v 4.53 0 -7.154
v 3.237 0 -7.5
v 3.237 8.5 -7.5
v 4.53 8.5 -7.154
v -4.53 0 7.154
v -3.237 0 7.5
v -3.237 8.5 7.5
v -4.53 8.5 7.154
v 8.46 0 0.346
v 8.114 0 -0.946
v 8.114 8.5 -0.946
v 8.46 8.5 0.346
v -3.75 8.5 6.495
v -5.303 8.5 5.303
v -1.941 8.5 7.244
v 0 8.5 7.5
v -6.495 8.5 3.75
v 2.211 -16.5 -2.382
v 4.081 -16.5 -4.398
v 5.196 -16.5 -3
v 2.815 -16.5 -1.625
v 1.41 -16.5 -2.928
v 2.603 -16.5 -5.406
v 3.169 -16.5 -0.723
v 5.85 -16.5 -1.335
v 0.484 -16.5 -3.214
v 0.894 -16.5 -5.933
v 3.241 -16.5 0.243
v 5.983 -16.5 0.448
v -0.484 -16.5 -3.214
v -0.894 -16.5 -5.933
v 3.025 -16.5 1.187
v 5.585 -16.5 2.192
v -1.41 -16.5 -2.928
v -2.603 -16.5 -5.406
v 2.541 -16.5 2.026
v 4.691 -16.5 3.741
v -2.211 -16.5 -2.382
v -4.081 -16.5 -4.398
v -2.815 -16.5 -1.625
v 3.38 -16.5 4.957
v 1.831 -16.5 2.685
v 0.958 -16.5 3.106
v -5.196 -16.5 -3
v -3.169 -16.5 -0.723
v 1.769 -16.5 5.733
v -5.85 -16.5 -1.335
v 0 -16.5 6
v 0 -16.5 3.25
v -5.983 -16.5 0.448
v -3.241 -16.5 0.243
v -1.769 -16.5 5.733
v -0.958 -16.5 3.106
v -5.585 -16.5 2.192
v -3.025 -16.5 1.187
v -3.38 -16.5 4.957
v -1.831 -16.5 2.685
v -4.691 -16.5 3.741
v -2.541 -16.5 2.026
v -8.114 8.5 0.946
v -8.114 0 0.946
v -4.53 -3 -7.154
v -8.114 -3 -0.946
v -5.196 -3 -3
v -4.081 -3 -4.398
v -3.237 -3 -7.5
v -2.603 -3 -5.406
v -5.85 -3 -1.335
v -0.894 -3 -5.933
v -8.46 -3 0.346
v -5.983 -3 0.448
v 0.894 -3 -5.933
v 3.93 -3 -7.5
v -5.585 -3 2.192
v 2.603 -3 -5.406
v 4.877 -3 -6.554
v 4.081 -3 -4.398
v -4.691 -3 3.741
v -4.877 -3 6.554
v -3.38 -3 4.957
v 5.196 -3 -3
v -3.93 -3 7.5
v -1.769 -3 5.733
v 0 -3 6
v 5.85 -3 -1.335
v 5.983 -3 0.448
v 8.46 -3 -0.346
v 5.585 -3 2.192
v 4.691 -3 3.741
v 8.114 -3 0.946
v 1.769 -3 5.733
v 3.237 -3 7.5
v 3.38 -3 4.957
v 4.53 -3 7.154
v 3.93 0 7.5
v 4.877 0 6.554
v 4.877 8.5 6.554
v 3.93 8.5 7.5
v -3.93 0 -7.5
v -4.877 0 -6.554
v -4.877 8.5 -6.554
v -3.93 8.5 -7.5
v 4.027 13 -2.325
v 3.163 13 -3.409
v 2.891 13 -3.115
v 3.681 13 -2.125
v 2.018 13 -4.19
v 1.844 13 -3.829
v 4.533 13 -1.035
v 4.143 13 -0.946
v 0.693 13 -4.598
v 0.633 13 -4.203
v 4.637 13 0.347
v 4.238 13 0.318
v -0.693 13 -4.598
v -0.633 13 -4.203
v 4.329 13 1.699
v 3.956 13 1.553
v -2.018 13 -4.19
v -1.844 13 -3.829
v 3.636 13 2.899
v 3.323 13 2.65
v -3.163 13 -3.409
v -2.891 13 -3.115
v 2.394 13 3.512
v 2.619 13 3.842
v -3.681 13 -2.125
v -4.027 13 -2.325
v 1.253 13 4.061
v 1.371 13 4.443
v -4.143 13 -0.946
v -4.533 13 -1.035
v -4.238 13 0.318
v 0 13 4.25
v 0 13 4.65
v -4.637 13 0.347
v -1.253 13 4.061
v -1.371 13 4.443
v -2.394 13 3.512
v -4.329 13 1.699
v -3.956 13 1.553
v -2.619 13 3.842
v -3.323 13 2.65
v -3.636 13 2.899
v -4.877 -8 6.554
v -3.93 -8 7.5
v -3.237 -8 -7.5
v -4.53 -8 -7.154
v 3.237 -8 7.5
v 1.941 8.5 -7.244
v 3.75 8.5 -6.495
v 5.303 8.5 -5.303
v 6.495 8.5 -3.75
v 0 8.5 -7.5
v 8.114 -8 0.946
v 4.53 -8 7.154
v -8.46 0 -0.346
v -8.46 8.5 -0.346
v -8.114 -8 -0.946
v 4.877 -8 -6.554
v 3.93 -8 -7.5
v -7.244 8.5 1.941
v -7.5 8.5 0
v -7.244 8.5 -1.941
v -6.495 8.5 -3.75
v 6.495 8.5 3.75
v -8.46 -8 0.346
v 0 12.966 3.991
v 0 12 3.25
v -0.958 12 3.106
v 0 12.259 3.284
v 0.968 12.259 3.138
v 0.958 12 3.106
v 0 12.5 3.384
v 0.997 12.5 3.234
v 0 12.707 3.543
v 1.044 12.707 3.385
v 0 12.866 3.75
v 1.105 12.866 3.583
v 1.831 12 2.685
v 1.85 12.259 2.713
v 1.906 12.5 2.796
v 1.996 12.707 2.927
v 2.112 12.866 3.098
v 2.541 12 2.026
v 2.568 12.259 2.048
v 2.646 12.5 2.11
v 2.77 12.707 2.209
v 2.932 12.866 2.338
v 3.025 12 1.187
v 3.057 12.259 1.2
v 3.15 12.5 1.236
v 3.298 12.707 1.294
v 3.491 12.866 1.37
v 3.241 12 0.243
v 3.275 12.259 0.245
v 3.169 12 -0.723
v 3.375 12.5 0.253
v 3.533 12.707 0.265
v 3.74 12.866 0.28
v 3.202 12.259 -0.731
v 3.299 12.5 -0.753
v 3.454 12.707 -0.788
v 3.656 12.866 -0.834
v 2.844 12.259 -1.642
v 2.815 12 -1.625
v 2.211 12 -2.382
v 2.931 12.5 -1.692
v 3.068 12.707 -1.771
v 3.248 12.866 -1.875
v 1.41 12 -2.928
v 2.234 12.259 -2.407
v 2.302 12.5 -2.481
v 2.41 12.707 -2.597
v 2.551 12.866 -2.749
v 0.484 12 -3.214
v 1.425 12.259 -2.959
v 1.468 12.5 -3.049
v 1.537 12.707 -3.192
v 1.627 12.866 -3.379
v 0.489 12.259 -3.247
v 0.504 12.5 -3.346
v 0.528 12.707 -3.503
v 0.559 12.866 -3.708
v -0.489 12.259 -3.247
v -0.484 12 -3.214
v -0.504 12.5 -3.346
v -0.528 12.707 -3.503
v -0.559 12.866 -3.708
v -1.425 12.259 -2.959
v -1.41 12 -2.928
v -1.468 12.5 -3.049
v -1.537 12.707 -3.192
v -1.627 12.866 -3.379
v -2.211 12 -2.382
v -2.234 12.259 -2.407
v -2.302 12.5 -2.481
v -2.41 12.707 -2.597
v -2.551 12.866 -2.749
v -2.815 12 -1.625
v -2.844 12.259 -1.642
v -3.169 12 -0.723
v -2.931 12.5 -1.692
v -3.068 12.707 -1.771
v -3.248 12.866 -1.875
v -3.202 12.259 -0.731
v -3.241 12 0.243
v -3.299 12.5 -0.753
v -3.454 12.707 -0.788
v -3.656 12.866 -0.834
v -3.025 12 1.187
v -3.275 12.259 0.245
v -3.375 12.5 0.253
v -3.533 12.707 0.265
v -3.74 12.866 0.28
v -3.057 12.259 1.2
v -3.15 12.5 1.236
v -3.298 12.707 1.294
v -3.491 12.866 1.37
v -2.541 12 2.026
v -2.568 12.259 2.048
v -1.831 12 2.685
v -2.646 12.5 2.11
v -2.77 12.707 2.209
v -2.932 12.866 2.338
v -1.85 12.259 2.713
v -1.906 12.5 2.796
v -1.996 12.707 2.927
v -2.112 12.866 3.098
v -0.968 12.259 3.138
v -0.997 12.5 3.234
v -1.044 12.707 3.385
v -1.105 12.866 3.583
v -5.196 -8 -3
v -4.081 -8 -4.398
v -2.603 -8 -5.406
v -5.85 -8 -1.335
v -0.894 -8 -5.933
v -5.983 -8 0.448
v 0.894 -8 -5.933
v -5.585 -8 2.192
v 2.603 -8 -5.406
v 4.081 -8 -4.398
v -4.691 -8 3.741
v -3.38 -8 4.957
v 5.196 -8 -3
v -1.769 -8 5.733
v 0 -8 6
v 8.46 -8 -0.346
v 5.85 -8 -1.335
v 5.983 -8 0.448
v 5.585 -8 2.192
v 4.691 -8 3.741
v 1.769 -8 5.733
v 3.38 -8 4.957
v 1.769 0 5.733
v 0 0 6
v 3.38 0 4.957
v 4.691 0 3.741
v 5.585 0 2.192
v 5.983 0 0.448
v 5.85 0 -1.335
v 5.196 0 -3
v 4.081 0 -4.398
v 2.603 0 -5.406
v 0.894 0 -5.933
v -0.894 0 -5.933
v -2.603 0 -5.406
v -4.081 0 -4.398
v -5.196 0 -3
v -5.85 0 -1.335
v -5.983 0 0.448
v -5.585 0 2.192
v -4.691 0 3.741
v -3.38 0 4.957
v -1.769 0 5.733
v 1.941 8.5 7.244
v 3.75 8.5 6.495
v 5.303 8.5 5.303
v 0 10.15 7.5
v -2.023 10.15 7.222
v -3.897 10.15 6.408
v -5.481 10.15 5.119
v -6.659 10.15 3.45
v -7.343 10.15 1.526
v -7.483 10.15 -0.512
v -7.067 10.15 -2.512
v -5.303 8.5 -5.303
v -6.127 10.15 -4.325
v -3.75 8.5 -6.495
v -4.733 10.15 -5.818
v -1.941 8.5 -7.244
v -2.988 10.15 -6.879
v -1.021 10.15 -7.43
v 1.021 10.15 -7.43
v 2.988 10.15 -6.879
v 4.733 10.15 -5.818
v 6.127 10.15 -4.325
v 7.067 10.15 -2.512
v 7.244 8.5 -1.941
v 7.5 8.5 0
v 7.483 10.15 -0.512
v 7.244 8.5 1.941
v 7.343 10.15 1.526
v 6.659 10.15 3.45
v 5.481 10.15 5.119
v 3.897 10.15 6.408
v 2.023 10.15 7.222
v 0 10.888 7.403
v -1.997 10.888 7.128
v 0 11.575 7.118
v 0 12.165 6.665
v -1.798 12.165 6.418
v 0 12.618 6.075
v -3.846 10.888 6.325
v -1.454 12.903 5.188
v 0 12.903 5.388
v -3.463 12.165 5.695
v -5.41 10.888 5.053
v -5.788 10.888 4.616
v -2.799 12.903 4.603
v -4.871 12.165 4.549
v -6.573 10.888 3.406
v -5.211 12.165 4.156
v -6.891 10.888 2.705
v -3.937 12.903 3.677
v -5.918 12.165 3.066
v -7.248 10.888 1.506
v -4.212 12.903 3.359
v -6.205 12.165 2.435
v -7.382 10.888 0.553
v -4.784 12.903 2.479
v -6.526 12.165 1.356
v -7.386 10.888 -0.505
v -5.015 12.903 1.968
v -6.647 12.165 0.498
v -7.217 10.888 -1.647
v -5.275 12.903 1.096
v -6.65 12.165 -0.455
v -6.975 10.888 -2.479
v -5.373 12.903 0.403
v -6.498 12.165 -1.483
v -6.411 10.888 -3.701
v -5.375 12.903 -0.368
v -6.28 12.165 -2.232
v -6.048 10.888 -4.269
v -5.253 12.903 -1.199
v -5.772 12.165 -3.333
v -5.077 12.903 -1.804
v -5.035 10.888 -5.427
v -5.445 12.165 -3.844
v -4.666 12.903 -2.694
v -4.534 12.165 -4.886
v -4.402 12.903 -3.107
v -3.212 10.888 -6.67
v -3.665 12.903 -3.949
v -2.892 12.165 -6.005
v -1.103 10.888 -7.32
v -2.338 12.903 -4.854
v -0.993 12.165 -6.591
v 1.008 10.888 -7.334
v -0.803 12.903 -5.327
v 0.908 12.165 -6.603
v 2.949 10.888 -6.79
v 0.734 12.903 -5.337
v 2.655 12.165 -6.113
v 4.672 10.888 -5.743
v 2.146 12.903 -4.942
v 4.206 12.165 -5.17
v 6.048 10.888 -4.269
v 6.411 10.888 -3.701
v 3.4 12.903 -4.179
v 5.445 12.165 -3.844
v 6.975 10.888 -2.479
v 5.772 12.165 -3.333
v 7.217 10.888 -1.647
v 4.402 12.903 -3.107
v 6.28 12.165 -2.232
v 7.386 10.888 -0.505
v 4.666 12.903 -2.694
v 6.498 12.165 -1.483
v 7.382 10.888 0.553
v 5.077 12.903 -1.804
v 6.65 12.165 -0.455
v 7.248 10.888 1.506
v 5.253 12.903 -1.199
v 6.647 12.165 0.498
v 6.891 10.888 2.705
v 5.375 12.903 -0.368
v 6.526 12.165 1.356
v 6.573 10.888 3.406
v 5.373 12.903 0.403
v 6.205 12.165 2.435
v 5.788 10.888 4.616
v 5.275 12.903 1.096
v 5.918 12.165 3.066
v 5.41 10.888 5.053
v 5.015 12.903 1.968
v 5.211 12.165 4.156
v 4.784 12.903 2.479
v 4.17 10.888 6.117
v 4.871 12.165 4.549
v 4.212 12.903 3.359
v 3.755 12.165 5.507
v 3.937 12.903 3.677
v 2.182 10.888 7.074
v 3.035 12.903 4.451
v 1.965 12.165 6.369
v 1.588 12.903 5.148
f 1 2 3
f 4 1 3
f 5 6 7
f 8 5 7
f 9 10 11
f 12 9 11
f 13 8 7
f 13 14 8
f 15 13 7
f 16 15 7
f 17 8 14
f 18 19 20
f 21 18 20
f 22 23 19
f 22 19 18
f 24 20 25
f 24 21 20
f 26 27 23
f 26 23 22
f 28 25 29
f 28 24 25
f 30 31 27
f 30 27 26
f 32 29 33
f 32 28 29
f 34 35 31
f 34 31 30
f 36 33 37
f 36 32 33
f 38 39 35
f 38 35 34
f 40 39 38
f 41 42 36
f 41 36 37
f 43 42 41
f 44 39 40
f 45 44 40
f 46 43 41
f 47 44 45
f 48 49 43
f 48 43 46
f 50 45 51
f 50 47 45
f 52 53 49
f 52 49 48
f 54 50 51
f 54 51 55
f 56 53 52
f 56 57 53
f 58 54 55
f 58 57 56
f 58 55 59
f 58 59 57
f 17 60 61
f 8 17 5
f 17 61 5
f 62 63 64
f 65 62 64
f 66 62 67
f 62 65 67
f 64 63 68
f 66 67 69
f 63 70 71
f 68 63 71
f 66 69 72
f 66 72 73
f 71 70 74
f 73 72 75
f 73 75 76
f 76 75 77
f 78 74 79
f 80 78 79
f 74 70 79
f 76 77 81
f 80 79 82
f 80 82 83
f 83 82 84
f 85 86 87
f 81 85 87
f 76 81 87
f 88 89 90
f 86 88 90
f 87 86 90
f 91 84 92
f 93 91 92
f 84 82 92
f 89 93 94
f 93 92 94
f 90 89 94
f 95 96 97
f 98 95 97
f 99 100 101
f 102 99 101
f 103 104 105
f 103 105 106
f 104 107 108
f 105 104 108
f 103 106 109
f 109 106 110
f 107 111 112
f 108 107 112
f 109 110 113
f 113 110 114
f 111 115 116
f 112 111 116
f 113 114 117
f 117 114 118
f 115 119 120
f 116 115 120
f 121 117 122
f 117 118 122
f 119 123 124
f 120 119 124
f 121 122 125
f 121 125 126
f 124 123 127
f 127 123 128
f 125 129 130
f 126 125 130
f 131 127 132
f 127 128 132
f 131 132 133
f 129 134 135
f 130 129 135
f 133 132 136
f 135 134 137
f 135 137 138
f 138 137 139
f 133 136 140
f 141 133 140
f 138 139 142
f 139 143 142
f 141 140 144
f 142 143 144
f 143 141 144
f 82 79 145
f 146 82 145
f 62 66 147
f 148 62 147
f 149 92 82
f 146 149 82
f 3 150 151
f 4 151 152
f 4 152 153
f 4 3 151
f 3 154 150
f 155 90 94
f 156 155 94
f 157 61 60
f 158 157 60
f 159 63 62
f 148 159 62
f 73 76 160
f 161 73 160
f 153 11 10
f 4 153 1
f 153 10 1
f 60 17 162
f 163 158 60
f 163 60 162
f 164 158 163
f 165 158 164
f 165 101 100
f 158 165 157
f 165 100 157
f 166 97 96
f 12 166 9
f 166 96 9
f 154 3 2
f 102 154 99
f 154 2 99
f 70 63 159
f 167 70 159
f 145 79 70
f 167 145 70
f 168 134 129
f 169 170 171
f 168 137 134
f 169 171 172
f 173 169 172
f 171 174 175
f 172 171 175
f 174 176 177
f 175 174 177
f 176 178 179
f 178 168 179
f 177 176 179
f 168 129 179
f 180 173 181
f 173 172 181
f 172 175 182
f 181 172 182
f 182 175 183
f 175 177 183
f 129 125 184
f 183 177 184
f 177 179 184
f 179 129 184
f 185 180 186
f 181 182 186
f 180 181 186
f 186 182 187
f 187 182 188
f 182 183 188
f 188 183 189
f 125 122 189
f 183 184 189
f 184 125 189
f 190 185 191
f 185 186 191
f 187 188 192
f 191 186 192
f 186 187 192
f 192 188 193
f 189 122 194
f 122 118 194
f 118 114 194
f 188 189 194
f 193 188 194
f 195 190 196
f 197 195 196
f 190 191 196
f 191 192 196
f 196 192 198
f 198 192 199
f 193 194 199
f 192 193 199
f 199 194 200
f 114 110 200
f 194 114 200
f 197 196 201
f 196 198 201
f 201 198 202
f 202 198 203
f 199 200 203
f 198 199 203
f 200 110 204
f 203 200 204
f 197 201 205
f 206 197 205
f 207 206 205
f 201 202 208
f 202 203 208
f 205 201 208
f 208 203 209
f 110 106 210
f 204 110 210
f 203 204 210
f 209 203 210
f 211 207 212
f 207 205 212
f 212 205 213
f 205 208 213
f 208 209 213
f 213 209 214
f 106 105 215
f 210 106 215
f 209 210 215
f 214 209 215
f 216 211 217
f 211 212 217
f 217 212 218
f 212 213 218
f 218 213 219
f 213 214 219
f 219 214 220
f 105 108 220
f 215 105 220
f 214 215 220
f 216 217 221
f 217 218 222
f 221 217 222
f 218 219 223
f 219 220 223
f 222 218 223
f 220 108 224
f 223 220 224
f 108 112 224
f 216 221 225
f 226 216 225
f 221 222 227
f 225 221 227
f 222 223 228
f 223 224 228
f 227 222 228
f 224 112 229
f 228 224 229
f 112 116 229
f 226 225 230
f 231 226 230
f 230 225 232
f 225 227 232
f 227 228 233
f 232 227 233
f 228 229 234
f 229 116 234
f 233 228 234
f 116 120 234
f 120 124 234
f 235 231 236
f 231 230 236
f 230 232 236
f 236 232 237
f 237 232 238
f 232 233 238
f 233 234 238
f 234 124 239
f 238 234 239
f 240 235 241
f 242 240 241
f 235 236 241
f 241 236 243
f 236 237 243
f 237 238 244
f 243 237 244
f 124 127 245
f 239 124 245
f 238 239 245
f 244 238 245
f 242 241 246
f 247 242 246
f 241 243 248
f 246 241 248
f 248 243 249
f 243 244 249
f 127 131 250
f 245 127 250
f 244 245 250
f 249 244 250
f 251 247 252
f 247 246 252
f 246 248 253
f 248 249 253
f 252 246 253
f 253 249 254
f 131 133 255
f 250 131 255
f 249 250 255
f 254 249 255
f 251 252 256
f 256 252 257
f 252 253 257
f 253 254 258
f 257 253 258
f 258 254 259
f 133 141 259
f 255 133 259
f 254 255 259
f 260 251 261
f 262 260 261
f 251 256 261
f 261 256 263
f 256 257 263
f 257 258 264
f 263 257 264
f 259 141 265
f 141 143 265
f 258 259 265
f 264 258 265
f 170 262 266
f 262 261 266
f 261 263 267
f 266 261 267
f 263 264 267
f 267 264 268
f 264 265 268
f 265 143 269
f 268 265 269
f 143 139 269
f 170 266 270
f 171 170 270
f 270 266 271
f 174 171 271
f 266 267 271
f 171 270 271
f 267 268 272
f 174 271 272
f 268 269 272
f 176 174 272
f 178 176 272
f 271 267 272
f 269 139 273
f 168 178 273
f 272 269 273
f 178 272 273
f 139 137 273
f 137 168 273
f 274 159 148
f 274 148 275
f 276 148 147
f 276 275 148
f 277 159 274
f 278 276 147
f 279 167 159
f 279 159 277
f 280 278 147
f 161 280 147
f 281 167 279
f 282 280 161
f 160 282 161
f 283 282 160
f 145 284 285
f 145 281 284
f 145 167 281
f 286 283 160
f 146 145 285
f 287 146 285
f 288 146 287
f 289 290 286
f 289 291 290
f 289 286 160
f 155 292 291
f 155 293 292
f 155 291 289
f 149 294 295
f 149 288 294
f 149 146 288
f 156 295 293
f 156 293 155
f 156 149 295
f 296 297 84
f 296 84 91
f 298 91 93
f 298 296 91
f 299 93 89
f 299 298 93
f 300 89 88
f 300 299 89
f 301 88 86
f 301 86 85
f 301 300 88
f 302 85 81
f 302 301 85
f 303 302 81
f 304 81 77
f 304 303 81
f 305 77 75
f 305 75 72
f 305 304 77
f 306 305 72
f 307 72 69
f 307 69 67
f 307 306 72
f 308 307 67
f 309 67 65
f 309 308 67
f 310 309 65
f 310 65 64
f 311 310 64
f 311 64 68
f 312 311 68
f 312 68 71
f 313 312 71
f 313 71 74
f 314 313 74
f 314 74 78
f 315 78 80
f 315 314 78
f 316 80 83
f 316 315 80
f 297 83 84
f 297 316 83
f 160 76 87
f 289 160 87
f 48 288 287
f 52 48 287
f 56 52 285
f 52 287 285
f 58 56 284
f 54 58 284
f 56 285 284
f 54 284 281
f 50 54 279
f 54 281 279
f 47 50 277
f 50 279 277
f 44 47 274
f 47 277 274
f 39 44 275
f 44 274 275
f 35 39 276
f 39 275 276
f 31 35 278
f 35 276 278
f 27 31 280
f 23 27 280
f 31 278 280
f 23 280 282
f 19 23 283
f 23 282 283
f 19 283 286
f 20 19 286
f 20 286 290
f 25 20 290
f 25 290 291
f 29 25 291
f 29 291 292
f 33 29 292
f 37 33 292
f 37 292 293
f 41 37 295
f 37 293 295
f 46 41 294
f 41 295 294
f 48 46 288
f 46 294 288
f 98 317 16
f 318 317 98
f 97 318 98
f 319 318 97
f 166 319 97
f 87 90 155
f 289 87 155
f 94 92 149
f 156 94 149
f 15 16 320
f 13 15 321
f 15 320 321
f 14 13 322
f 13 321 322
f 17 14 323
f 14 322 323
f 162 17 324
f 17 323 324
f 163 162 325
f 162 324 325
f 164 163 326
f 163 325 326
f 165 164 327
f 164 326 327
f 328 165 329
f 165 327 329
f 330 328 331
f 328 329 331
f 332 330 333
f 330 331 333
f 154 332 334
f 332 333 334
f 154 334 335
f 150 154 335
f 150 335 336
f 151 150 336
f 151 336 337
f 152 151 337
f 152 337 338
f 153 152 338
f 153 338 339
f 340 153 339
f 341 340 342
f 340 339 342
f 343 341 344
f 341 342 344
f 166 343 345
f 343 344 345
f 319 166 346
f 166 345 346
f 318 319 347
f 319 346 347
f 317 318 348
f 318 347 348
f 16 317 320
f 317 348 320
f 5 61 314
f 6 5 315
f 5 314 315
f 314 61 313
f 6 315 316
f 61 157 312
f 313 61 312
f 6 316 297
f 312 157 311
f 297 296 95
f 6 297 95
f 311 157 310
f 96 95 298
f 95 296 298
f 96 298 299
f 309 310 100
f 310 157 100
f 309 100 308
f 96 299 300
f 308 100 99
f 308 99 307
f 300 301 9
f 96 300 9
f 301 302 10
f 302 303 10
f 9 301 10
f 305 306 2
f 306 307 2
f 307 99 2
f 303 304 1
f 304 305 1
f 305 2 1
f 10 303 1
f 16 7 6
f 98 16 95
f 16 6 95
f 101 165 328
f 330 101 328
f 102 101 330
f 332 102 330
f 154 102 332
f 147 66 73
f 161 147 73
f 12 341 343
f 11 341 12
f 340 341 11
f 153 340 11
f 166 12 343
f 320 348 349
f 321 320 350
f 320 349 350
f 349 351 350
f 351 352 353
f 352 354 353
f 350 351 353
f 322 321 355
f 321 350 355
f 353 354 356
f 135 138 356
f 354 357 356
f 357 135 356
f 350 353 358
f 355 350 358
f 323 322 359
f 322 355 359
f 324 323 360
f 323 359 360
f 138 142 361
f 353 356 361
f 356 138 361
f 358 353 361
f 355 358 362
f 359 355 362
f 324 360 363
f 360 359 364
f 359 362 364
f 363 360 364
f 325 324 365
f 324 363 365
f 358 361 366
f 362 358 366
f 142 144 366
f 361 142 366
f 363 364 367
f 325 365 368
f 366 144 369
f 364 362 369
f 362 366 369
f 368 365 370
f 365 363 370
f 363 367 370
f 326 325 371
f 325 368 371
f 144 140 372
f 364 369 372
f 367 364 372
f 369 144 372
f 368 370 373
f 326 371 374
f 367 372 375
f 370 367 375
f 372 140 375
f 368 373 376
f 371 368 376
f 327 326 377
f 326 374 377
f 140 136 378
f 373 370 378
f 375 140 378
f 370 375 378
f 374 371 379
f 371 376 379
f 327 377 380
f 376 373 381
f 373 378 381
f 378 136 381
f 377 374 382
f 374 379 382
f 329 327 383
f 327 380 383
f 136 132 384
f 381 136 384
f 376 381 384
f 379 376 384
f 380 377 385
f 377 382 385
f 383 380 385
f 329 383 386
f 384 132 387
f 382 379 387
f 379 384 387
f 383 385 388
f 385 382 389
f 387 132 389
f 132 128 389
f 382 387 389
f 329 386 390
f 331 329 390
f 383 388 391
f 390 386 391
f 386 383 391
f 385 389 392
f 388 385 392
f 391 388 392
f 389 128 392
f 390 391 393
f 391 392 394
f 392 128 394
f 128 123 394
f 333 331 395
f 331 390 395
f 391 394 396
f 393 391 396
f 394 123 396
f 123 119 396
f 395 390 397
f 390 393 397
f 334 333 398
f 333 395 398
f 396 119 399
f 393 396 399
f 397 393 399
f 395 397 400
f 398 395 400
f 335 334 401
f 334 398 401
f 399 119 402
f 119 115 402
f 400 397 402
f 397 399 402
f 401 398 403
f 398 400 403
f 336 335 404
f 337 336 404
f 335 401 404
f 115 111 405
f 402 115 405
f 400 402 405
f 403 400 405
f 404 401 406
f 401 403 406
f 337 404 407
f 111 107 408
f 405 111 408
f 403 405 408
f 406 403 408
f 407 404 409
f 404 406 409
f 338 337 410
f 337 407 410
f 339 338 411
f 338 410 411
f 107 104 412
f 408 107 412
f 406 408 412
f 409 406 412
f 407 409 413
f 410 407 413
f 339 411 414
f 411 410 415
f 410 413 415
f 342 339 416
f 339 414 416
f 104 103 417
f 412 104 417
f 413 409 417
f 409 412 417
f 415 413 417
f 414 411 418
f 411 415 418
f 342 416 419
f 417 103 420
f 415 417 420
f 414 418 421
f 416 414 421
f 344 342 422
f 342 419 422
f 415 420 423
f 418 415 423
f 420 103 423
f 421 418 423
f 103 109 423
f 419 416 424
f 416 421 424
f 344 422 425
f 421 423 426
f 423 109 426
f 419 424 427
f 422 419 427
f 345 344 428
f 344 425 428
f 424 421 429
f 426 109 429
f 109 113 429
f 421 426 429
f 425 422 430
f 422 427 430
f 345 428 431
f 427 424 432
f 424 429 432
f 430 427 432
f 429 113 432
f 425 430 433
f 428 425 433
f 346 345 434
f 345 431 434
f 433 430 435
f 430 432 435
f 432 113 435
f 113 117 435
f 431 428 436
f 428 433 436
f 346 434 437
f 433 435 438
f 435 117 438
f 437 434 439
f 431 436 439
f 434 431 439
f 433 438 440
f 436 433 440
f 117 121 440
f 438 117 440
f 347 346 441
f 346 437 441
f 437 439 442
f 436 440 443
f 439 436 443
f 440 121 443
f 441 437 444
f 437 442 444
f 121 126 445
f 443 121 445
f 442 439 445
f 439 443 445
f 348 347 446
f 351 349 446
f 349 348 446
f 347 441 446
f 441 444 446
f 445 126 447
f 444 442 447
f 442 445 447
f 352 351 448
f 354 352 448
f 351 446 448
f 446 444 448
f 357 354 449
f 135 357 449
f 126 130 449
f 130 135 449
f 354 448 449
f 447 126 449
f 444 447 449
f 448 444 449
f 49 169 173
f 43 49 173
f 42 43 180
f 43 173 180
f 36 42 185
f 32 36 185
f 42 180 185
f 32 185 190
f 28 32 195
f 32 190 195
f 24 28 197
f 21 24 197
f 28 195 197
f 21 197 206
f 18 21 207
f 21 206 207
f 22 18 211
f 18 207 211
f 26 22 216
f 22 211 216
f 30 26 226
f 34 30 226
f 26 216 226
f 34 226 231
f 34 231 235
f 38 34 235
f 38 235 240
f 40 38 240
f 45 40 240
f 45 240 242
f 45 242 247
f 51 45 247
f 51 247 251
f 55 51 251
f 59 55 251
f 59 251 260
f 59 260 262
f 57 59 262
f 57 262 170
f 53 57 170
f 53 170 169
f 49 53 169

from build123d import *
from OCP.BRepFilletAPI import BRepFilletAPI_MakeChamfer

# Parameters (mm, degrees)
BOSS_EXTRUDE1_DEPTH = 8.5
SKETCH4_R           = 6
BOSS_EXTRUDE2_DEPTH = 3
BOSS_EXTRUDE3_DEPTH = 5
SKETCH6_R           = 6
BOSS_EXTRUDE4_DEPTH = 8.5
SKETCH3_R           = 3.25
CUT_EXTRUDE1_DEPTH  = 32.646484797
FILLET1_R           = 1
CHAMFER1_SIZE       = 0.4
CHAMFER1_SIZE2      = 1.092820323


with BuildPart() as part:
    # Sketch1 → Boss-Extrude1 (new body)
    with BuildSketch(Plane(origin=(0, 0, 0), x_dir=(1, 0, 0), z_dir=(0, 1, 0))):
        Polygon((8.660254038, 0), (4.330127019, 7.5), (-4.330127019, 7.5), (-8.660254038, 0), (-4.330127019, -7.5), (4.330127019, -7.5), align=None)
    extrude(amount=BOSS_EXTRUDE1_DEPTH)

    # Sketch2 → Revolve1 (revolve)
    with BuildSketch(Plane(origin=(0, 0, 0), x_dir=(0, 0, -1), z_dir=(1, 0, 0))):
        with BuildLine():
            Line((-7.5, 8.5), (-7.5, 10.15))
            ThreePointArc((-7.5, 10.15), (-6.665254326, 12.165254326), (-4.65, 13))
            Line((-4.65, 13), (0, 13))
            Line((0, 13), (0, 8.5))
            Line((0, 8.5), (-7.5, 8.5))
        make_face()
    revolve(axis=Axis((0, 13, 0), (0, -1, 0)))

    # Sketch4 → Boss-Extrude2 (add)
    with BuildSketch(Plane(origin=(0, 0, 0), x_dir=(1, 0, 0), z_dir=(0, 1, 0))):
        with Locations(Location((0, 0, 0), (0, 0, 270))):
            Circle(SKETCH4_R)
    extrude(amount=-BOSS_EXTRUDE2_DEPTH)

    # Sketch5 → Boss-Extrude3 (add)
    with BuildSketch(Plane.XZ.offset(3)):
        Polygon((8.660254038, 0), (4.330127019, 7.5), (-4.330127019, 7.5), (-8.660254038, 0), (-4.330127019, -7.5), (4.330127019, -7.5), align=None)
    extrude(amount=BOSS_EXTRUDE3_DEPTH)

    # Sketch6 → Boss-Extrude4 (add)
    with BuildSketch(Plane.XZ.offset(8)):
        with Locations(Location((0, 0, 0), (0, 0, 90))):
            Circle(SKETCH6_R)
    extrude(amount=BOSS_EXTRUDE4_DEPTH)

    # Sketch3 → Cut-Extrude1 (cut, through all)
    with BuildSketch(Plane(origin=(0, 13, 0), x_dir=(1, 0, 0), z_dir=(0, 1, 0))):
        with Locations(Location((0, 0, 0), (0, 0, 270))):
            Circle(SKETCH3_R)
    extrude(amount=-CUT_EXTRUDE1_DEPTH, mode=Mode.SUBTRACT)

    # Fillet1
    fillet1_edges = [part.edges().sort_by_distance(p)[0] for p in [
        (0, 13, -3.25),
    ]]
    fillet(fillet1_edges, radius=FILLET1_R)

    # Chamfer1: one chamfer whose edges measure the first distance from different faces: ONE call of the kernel's chamfer builder (chamfer() names one face for all edges)
    chamfer1_edges_1 = [part.edges().sort_by_distance(p)[0] for p in [
        (4.330127019, 4.25, 7.5),
    ]]
    chamfer1_side_1 = [part.faces().sort_by_distance(p)[0] for p in [
        (0, 4.25, 7.5),
    ]]
    chamfer1_edges_2 = [part.edges().sort_by_distance(p)[0] for p in [
        (-4.330127019, 4.25, 7.5),
    ]]
    chamfer1_side_2 = [part.faces().sort_by_distance(p)[0] for p in [
        (-6.495190528, 4.25, 3.75),
    ]]
    chamfer1_edges_3 = [part.edges().sort_by_distance(p)[0] for p in [
        (-8.660254038, 4.25, 0),
    ]]
    chamfer1_side_3 = [part.faces().sort_by_distance(p)[0] for p in [
        (-6.495190528, 4.25, -3.75),
    ]]
    chamfer1_edges_4 = [part.edges().sort_by_distance(p)[0] for p in [
        (-4.330127019, 4.25, -7.5),
    ]]
    chamfer1_side_4 = [part.faces().sort_by_distance(p)[0] for p in [
        (0, 4.25, -7.5),
    ]]
    chamfer1_edges_5 = [part.edges().sort_by_distance(p)[0] for p in [
        (4.330127019, 4.25, -7.5),
    ]]
    chamfer1_side_5 = [part.faces().sort_by_distance(p)[0] for p in [
        (6.495190528, 4.25, -3.75),
    ]]
    chamfer1_edges_6 = [part.edges().sort_by_distance(p)[0] for p in [
        (8.660254038, 4.25, 0),
    ]]
    chamfer1_side_6 = [part.faces().sort_by_distance(p)[0] for p in [
        (6.495190528, 4.25, 3.75),
    ]]
    chamfer1_edges_7 = [part.edges().sort_by_distance(p)[0] for p in [
        (4.330127019, -5.5, -7.5),
    ]]
    chamfer1_side_7 = [part.faces().sort_by_distance(p)[0] for p in [
        (0, -5.5, -7.5),
    ]]
    chamfer1_edges_8 = [part.edges().sort_by_distance(p)[0] for p in [
        (8.660254038, -5.5, 0),
    ]]
    chamfer1_side_8 = [part.faces().sort_by_distance(p)[0] for p in [
        (6.495190528, -5.5, -3.75),
    ]]
    chamfer1_edges_9 = [part.edges().sort_by_distance(p)[0] for p in [
        (4.330127019, -5.5, 7.5),
    ]]
    chamfer1_side_9 = [part.faces().sort_by_distance(p)[0] for p in [
        (6.495190528, -5.5, 3.75),
    ]]
    chamfer1_edges_10 = [part.edges().sort_by_distance(p)[0] for p in [
        (-4.330127019, -5.5, 7.5),
    ]]
    chamfer1_side_10 = [part.faces().sort_by_distance(p)[0] for p in [
        (0, -5.5, 7.5),
    ]]
    chamfer1_edges_11 = [part.edges().sort_by_distance(p)[0] for p in [
        (-8.660254038, -5.5, 0),
    ]]
    chamfer1_side_11 = [part.faces().sort_by_distance(p)[0] for p in [
        (-6.495190528, -5.5, 3.75),
    ]]
    chamfer1_edges_12 = [part.edges().sort_by_distance(p)[0] for p in [
        (-4.330127019, -5.5, -7.5),
    ]]
    chamfer1_side_12 = [part.faces().sort_by_distance(p)[0] for p in [
        (-6.495190528, -5.5, -3.75),
    ]]
    chamfer1 = BRepFilletAPI_MakeChamfer(part.part.solid().wrapped)
    for e in chamfer1_edges_1:
        chamfer1.Add(CHAMFER1_SIZE, CHAMFER1_SIZE2, e.wrapped, chamfer1_side_1[0].wrapped)  # the first distance lies on this face
    for e in chamfer1_edges_2:
        chamfer1.Add(CHAMFER1_SIZE, CHAMFER1_SIZE2, e.wrapped, chamfer1_side_2[0].wrapped)  # the first distance lies on this face
    for e in chamfer1_edges_3:
        chamfer1.Add(CHAMFER1_SIZE, CHAMFER1_SIZE2, e.wrapped, chamfer1_side_3[0].wrapped)  # the first distance lies on this face
    for e in chamfer1_edges_4:
        chamfer1.Add(CHAMFER1_SIZE, CHAMFER1_SIZE2, e.wrapped, chamfer1_side_4[0].wrapped)  # the first distance lies on this face
    for e in chamfer1_edges_5:
        chamfer1.Add(CHAMFER1_SIZE, CHAMFER1_SIZE2, e.wrapped, chamfer1_side_5[0].wrapped)  # the first distance lies on this face
    for e in chamfer1_edges_6:
        chamfer1.Add(CHAMFER1_SIZE, CHAMFER1_SIZE2, e.wrapped, chamfer1_side_6[0].wrapped)  # the first distance lies on this face
    for e in chamfer1_edges_7:
        chamfer1.Add(CHAMFER1_SIZE, CHAMFER1_SIZE2, e.wrapped, chamfer1_side_7[0].wrapped)  # the first distance lies on this face
    for e in chamfer1_edges_8:
        chamfer1.Add(CHAMFER1_SIZE, CHAMFER1_SIZE2, e.wrapped, chamfer1_side_8[0].wrapped)  # the first distance lies on this face
    for e in chamfer1_edges_9:
        chamfer1.Add(CHAMFER1_SIZE, CHAMFER1_SIZE2, e.wrapped, chamfer1_side_9[0].wrapped)  # the first distance lies on this face
    for e in chamfer1_edges_10:
        chamfer1.Add(CHAMFER1_SIZE, CHAMFER1_SIZE2, e.wrapped, chamfer1_side_10[0].wrapped)  # the first distance lies on this face
    for e in chamfer1_edges_11:
        chamfer1.Add(CHAMFER1_SIZE, CHAMFER1_SIZE2, e.wrapped, chamfer1_side_11[0].wrapped)  # the first distance lies on this face
    for e in chamfer1_edges_12:
        chamfer1.Add(CHAMFER1_SIZE, CHAMFER1_SIZE2, e.wrapped, chamfer1_side_12[0].wrapped)  # the first distance lies on this face
    add(Compound.cast(chamfer1.Shape()), mode=Mode.REPLACE)


solid = part.part
